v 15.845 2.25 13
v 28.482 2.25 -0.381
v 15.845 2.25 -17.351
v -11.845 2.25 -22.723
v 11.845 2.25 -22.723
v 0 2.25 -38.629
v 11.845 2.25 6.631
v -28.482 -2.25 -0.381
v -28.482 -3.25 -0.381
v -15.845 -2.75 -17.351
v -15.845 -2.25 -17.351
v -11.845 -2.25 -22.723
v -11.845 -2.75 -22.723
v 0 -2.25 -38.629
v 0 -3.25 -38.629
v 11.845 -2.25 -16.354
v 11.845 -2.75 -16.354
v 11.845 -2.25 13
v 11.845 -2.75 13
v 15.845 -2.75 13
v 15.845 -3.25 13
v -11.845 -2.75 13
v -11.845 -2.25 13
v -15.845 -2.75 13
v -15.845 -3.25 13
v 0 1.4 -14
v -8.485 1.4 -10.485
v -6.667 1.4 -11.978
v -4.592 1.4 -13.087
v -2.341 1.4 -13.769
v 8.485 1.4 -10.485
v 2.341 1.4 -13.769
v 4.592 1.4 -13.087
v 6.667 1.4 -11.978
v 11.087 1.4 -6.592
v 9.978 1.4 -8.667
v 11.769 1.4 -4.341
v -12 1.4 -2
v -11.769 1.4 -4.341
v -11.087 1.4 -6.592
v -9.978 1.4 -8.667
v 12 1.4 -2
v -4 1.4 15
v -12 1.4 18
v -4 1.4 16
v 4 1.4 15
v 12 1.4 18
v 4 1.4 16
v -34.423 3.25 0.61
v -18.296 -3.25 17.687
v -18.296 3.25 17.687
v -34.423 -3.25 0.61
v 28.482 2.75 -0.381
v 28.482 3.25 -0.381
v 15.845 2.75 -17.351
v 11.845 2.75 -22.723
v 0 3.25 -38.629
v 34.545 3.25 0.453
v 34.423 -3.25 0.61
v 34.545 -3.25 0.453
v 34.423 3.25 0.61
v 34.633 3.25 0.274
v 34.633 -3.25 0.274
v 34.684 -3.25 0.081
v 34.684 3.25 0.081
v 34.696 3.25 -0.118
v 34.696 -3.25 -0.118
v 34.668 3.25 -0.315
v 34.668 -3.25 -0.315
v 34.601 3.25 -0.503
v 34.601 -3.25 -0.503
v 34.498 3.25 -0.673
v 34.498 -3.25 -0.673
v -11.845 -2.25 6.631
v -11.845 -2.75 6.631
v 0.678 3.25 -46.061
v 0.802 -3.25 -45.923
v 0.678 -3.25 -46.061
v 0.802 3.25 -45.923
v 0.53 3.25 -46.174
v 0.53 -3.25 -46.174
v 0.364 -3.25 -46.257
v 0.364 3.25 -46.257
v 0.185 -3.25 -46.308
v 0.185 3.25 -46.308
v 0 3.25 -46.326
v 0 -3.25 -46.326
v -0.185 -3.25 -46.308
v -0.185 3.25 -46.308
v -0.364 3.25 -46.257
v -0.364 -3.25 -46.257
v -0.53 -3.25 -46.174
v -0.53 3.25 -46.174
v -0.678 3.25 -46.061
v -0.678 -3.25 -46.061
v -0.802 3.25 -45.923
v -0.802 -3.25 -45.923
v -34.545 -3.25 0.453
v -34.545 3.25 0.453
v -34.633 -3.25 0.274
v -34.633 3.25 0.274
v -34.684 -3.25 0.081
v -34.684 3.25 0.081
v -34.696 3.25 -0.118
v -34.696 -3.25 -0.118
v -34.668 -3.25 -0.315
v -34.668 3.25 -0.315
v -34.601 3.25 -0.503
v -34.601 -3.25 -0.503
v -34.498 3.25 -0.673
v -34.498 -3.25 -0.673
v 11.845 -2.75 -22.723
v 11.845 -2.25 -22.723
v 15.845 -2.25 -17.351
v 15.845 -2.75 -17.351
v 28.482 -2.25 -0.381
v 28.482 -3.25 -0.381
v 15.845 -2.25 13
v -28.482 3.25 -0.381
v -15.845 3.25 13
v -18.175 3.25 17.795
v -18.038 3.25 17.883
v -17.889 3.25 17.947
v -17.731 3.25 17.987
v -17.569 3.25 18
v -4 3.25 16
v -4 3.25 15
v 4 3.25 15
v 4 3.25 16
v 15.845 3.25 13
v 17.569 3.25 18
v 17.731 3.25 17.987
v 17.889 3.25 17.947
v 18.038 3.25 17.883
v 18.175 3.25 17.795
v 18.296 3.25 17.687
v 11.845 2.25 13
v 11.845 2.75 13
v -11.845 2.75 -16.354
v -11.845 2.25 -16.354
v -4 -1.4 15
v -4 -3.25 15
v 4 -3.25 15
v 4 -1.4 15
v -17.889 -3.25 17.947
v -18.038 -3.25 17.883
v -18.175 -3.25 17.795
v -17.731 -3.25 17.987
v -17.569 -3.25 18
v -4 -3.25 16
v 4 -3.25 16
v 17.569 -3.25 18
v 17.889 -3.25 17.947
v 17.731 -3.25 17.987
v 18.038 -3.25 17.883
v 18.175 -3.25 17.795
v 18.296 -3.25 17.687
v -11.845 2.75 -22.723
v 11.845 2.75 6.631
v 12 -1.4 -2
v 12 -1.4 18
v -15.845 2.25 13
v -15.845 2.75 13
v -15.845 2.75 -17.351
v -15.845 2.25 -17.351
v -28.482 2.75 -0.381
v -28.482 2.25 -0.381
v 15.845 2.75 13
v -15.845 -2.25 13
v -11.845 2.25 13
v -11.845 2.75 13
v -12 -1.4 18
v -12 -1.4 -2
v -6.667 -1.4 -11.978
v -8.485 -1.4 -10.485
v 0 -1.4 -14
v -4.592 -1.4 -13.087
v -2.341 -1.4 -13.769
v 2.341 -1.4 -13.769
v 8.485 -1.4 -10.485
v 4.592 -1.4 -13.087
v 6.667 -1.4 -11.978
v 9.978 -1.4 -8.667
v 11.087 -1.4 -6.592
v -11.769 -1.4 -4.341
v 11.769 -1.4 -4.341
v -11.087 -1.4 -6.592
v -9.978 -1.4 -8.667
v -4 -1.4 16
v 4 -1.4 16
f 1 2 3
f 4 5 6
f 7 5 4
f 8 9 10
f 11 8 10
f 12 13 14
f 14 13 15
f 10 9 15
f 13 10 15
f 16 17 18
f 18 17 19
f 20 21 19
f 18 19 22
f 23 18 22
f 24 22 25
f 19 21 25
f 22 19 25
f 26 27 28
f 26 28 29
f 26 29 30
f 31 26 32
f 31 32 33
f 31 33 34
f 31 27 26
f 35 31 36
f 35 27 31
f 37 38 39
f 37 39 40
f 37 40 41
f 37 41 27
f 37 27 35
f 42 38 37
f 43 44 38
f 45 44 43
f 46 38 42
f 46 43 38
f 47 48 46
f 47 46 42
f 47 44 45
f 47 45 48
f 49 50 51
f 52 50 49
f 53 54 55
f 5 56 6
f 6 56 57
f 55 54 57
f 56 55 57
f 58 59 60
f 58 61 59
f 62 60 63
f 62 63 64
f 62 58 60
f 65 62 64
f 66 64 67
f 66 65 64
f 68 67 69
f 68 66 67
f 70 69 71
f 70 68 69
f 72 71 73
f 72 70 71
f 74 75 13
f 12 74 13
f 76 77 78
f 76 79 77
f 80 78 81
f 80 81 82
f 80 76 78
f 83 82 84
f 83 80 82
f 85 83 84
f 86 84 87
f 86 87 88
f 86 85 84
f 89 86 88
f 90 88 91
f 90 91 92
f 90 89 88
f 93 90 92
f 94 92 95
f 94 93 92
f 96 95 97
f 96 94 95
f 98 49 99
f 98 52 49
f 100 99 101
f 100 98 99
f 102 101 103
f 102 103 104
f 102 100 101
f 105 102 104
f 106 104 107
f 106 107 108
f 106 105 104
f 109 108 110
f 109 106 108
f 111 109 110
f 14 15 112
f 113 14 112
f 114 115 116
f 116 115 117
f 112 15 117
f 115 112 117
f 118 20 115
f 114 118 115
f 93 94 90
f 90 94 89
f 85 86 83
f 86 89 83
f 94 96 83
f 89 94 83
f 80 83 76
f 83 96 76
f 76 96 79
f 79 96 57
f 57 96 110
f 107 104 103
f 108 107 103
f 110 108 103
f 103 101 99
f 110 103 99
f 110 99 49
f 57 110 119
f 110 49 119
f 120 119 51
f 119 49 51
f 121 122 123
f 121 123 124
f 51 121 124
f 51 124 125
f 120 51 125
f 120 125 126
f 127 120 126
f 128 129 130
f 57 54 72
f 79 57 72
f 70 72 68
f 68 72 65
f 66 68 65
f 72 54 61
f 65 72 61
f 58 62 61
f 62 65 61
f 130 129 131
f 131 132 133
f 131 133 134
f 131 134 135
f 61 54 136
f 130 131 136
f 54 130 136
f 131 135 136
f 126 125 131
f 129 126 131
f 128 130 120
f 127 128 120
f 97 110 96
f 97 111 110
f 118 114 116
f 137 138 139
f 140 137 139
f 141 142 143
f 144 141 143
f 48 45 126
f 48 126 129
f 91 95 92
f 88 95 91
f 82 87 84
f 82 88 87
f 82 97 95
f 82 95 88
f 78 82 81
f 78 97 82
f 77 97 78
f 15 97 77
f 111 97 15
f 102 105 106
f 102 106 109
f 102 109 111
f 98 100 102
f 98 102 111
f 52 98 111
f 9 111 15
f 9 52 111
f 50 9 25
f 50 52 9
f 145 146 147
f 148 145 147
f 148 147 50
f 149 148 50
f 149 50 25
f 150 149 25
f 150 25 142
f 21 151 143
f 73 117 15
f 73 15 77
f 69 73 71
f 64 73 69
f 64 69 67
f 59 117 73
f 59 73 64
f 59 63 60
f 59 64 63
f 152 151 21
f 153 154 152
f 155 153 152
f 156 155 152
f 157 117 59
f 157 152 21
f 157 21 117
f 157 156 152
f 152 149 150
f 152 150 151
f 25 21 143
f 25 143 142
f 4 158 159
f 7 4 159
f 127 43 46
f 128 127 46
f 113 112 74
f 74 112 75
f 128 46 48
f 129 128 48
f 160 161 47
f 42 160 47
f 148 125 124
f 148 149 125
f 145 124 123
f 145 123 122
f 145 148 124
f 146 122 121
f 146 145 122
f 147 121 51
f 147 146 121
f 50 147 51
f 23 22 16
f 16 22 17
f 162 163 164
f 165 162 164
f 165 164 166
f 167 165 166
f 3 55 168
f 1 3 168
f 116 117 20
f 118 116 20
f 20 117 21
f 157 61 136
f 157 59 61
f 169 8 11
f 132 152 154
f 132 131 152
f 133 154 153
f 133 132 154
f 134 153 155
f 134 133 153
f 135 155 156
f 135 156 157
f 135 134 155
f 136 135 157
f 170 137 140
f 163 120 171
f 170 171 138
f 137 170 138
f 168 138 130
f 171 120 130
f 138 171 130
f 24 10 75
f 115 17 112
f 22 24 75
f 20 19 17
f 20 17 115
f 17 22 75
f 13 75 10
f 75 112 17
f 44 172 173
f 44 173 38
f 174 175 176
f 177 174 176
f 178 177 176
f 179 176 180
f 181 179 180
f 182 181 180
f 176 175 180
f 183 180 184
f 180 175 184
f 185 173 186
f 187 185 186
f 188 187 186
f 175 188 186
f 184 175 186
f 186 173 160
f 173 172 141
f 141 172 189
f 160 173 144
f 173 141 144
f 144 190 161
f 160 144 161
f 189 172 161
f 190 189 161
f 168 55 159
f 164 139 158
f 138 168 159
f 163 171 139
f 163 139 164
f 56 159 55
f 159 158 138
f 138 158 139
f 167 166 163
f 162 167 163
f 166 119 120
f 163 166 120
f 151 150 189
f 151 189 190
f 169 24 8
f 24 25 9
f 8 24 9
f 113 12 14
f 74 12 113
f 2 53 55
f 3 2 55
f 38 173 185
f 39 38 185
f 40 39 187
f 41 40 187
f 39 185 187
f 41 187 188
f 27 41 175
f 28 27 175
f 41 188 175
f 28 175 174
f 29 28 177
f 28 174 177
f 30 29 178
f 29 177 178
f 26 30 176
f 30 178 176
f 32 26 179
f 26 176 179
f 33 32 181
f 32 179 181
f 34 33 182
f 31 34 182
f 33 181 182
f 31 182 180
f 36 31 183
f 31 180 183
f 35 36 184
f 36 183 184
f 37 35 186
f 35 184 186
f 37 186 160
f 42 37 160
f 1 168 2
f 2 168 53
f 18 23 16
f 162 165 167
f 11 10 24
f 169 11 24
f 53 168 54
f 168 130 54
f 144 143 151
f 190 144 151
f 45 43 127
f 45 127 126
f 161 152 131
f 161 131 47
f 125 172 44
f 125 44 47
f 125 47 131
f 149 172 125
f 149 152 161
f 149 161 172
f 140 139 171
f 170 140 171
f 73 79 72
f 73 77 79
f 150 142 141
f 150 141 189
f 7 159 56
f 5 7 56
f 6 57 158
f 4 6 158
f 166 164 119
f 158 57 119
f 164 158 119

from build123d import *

# Parameters (mm, degrees)
F1_DEPTH  = 3.25
F3_DEPTH  = 0.5
F5_DEPTH  = 0.5
F7_DEPTH  = 0.5
F9_DEPTH  = 0.5
F10_W     = 24
F10_H     = 2.8
F11_DEPTH = 20
F13_DEPTH = 1.4
F14_W     = 8
F14_H     = 1
F15_DEPTH = 25
F16_R     = 1


# Not quite as in the source:
# - ends of sketch curves that miss each other by under 0.0002 mm in the source are joined


with BuildPart() as f1:
    # F0 (on Front) → F1 (new body, symmetric)
    with BuildSketch(Plane.XZ):
        Polygon((18, 18), (0, 18), (-18, 18), (-35, 0), (0, -47), (35, 0), align=None)
    extrude(amount=F1_DEPTH, both=True)

    # F2 (on face) → F3 (cut)
    with BuildSketch(Plane.XZ.offset(3.25)):
        Polygon((15.8447675538, 13), (-15.8447675538, 13), (-28.4822773709, -0.3808927475), (1.162e-07, -38.628522516), (28.4822775009, -0.3808928851), align=None)
    extrude(amount=-F3_DEPTH, mode=Mode.SUBTRACT)

    # F4 (on face) → F5 (cut)
    with BuildSketch(Plane(origin=(0, 3.25, 0), x_dir=(-1, 0, 0), z_dir=(0, 1, 0))):
        Polygon((28.482277527, -0.3808925379), (15.8447676545, 13.0000002682), (-15.8447670441, 13.0000002682), (-28.4822772579, -0.3808928993), (0, -38.6285223599), align=None)
    extrude(amount=-F5_DEPTH, mode=Mode.SUBTRACT)

    # F6 (on face) → F7 (cut)
    with BuildSketch(Plane.XZ.offset(2.75)):
        Polygon((-15.8447675538, -17.3512630734), (-15.8447675538, 13), (-28.4822773709, -0.3808927475), align=None)
        Polygon((28.4822775009, -0.3808928851), (15.8447675538, 13), (15.8447675538, -17.3512633855), align=None)
        Polygon((11.8447675538, -22.7226919569), (-11.8447675538, 6.6308805462), (-11.8447675538, -22.7226916448), (1.162e-07, -38.628522516), align=None)
        Polygon((11.8447675538, -16.3535725031), (11.8447675538, 13), (-11.8447675538, 13), align=None)
    extrude(amount=-F7_DEPTH, mode=Mode.SUBTRACT)

    # F8 (on face) → F9 (cut)
    with BuildSketch(Plane(origin=(0, 2.75, 0), x_dir=(-1, 0, 0), z_dir=(0, 1, 0))):
        Polygon((-15.8447675538, -17.3512633855), (-15.8447675538, 13), (-28.4822772579, -0.3808928993), align=None)
        Polygon((28.482277527, -0.3808925379), (15.8447676545, 13.0000002682), (15.8447675538, -17.3512630734), align=None)
        Polygon((11.8447675538, -16.353572196), (11.8447675538, 13.0000002682), (-11.8447675538, 13.0000002682), align=None)
        Polygon((0, -38.6285223599), (11.8447675538, -22.7226916448), (-11.8447675538, 6.6308808195), (-11.8447675538, -22.7226916448), align=None)
    extrude(amount=-F9_DEPTH, mode=Mode.SUBTRACT)

    # F10 (on face) → F11 (cut)
    with BuildSketch(Plane.XY.offset(18)):
        Rectangle(F10_W, F10_H)
    extrude(amount=-F11_DEPTH, mode=Mode.SUBTRACT)

    # F12 (on Front) → F13 (cut, symmetric)
    with BuildSketch(Plane.XZ):
        with BuildLine():
            Line((12, -2), (-12, -2))
            ThreePointArc((-12, -2), (0, -14), (12, -2))
        make_face()
    extrude(amount=F13_DEPTH, both=True, mode=Mode.SUBTRACT)

    # F14 (on face) → F15 (cut)
    with BuildSketch(Plane.XZ.offset(3.25)):
        with Locations((0, 15.5)):
            Rectangle(F14_W, F14_H)
    extrude(amount=-F15_DEPTH, mode=Mode.SUBTRACT)

    # F16
    f16_edges = [f1.edges().sort_by_distance(p)[0] for p in [
        (0, 0, -47),
        (35, 0, 0),
        (-35, 0, 0),
        (-18, 0, 18),
        (18, 0, 18),
    ]]
    fillet(f16_edges, radius=F16_R)


solid = f1.part
